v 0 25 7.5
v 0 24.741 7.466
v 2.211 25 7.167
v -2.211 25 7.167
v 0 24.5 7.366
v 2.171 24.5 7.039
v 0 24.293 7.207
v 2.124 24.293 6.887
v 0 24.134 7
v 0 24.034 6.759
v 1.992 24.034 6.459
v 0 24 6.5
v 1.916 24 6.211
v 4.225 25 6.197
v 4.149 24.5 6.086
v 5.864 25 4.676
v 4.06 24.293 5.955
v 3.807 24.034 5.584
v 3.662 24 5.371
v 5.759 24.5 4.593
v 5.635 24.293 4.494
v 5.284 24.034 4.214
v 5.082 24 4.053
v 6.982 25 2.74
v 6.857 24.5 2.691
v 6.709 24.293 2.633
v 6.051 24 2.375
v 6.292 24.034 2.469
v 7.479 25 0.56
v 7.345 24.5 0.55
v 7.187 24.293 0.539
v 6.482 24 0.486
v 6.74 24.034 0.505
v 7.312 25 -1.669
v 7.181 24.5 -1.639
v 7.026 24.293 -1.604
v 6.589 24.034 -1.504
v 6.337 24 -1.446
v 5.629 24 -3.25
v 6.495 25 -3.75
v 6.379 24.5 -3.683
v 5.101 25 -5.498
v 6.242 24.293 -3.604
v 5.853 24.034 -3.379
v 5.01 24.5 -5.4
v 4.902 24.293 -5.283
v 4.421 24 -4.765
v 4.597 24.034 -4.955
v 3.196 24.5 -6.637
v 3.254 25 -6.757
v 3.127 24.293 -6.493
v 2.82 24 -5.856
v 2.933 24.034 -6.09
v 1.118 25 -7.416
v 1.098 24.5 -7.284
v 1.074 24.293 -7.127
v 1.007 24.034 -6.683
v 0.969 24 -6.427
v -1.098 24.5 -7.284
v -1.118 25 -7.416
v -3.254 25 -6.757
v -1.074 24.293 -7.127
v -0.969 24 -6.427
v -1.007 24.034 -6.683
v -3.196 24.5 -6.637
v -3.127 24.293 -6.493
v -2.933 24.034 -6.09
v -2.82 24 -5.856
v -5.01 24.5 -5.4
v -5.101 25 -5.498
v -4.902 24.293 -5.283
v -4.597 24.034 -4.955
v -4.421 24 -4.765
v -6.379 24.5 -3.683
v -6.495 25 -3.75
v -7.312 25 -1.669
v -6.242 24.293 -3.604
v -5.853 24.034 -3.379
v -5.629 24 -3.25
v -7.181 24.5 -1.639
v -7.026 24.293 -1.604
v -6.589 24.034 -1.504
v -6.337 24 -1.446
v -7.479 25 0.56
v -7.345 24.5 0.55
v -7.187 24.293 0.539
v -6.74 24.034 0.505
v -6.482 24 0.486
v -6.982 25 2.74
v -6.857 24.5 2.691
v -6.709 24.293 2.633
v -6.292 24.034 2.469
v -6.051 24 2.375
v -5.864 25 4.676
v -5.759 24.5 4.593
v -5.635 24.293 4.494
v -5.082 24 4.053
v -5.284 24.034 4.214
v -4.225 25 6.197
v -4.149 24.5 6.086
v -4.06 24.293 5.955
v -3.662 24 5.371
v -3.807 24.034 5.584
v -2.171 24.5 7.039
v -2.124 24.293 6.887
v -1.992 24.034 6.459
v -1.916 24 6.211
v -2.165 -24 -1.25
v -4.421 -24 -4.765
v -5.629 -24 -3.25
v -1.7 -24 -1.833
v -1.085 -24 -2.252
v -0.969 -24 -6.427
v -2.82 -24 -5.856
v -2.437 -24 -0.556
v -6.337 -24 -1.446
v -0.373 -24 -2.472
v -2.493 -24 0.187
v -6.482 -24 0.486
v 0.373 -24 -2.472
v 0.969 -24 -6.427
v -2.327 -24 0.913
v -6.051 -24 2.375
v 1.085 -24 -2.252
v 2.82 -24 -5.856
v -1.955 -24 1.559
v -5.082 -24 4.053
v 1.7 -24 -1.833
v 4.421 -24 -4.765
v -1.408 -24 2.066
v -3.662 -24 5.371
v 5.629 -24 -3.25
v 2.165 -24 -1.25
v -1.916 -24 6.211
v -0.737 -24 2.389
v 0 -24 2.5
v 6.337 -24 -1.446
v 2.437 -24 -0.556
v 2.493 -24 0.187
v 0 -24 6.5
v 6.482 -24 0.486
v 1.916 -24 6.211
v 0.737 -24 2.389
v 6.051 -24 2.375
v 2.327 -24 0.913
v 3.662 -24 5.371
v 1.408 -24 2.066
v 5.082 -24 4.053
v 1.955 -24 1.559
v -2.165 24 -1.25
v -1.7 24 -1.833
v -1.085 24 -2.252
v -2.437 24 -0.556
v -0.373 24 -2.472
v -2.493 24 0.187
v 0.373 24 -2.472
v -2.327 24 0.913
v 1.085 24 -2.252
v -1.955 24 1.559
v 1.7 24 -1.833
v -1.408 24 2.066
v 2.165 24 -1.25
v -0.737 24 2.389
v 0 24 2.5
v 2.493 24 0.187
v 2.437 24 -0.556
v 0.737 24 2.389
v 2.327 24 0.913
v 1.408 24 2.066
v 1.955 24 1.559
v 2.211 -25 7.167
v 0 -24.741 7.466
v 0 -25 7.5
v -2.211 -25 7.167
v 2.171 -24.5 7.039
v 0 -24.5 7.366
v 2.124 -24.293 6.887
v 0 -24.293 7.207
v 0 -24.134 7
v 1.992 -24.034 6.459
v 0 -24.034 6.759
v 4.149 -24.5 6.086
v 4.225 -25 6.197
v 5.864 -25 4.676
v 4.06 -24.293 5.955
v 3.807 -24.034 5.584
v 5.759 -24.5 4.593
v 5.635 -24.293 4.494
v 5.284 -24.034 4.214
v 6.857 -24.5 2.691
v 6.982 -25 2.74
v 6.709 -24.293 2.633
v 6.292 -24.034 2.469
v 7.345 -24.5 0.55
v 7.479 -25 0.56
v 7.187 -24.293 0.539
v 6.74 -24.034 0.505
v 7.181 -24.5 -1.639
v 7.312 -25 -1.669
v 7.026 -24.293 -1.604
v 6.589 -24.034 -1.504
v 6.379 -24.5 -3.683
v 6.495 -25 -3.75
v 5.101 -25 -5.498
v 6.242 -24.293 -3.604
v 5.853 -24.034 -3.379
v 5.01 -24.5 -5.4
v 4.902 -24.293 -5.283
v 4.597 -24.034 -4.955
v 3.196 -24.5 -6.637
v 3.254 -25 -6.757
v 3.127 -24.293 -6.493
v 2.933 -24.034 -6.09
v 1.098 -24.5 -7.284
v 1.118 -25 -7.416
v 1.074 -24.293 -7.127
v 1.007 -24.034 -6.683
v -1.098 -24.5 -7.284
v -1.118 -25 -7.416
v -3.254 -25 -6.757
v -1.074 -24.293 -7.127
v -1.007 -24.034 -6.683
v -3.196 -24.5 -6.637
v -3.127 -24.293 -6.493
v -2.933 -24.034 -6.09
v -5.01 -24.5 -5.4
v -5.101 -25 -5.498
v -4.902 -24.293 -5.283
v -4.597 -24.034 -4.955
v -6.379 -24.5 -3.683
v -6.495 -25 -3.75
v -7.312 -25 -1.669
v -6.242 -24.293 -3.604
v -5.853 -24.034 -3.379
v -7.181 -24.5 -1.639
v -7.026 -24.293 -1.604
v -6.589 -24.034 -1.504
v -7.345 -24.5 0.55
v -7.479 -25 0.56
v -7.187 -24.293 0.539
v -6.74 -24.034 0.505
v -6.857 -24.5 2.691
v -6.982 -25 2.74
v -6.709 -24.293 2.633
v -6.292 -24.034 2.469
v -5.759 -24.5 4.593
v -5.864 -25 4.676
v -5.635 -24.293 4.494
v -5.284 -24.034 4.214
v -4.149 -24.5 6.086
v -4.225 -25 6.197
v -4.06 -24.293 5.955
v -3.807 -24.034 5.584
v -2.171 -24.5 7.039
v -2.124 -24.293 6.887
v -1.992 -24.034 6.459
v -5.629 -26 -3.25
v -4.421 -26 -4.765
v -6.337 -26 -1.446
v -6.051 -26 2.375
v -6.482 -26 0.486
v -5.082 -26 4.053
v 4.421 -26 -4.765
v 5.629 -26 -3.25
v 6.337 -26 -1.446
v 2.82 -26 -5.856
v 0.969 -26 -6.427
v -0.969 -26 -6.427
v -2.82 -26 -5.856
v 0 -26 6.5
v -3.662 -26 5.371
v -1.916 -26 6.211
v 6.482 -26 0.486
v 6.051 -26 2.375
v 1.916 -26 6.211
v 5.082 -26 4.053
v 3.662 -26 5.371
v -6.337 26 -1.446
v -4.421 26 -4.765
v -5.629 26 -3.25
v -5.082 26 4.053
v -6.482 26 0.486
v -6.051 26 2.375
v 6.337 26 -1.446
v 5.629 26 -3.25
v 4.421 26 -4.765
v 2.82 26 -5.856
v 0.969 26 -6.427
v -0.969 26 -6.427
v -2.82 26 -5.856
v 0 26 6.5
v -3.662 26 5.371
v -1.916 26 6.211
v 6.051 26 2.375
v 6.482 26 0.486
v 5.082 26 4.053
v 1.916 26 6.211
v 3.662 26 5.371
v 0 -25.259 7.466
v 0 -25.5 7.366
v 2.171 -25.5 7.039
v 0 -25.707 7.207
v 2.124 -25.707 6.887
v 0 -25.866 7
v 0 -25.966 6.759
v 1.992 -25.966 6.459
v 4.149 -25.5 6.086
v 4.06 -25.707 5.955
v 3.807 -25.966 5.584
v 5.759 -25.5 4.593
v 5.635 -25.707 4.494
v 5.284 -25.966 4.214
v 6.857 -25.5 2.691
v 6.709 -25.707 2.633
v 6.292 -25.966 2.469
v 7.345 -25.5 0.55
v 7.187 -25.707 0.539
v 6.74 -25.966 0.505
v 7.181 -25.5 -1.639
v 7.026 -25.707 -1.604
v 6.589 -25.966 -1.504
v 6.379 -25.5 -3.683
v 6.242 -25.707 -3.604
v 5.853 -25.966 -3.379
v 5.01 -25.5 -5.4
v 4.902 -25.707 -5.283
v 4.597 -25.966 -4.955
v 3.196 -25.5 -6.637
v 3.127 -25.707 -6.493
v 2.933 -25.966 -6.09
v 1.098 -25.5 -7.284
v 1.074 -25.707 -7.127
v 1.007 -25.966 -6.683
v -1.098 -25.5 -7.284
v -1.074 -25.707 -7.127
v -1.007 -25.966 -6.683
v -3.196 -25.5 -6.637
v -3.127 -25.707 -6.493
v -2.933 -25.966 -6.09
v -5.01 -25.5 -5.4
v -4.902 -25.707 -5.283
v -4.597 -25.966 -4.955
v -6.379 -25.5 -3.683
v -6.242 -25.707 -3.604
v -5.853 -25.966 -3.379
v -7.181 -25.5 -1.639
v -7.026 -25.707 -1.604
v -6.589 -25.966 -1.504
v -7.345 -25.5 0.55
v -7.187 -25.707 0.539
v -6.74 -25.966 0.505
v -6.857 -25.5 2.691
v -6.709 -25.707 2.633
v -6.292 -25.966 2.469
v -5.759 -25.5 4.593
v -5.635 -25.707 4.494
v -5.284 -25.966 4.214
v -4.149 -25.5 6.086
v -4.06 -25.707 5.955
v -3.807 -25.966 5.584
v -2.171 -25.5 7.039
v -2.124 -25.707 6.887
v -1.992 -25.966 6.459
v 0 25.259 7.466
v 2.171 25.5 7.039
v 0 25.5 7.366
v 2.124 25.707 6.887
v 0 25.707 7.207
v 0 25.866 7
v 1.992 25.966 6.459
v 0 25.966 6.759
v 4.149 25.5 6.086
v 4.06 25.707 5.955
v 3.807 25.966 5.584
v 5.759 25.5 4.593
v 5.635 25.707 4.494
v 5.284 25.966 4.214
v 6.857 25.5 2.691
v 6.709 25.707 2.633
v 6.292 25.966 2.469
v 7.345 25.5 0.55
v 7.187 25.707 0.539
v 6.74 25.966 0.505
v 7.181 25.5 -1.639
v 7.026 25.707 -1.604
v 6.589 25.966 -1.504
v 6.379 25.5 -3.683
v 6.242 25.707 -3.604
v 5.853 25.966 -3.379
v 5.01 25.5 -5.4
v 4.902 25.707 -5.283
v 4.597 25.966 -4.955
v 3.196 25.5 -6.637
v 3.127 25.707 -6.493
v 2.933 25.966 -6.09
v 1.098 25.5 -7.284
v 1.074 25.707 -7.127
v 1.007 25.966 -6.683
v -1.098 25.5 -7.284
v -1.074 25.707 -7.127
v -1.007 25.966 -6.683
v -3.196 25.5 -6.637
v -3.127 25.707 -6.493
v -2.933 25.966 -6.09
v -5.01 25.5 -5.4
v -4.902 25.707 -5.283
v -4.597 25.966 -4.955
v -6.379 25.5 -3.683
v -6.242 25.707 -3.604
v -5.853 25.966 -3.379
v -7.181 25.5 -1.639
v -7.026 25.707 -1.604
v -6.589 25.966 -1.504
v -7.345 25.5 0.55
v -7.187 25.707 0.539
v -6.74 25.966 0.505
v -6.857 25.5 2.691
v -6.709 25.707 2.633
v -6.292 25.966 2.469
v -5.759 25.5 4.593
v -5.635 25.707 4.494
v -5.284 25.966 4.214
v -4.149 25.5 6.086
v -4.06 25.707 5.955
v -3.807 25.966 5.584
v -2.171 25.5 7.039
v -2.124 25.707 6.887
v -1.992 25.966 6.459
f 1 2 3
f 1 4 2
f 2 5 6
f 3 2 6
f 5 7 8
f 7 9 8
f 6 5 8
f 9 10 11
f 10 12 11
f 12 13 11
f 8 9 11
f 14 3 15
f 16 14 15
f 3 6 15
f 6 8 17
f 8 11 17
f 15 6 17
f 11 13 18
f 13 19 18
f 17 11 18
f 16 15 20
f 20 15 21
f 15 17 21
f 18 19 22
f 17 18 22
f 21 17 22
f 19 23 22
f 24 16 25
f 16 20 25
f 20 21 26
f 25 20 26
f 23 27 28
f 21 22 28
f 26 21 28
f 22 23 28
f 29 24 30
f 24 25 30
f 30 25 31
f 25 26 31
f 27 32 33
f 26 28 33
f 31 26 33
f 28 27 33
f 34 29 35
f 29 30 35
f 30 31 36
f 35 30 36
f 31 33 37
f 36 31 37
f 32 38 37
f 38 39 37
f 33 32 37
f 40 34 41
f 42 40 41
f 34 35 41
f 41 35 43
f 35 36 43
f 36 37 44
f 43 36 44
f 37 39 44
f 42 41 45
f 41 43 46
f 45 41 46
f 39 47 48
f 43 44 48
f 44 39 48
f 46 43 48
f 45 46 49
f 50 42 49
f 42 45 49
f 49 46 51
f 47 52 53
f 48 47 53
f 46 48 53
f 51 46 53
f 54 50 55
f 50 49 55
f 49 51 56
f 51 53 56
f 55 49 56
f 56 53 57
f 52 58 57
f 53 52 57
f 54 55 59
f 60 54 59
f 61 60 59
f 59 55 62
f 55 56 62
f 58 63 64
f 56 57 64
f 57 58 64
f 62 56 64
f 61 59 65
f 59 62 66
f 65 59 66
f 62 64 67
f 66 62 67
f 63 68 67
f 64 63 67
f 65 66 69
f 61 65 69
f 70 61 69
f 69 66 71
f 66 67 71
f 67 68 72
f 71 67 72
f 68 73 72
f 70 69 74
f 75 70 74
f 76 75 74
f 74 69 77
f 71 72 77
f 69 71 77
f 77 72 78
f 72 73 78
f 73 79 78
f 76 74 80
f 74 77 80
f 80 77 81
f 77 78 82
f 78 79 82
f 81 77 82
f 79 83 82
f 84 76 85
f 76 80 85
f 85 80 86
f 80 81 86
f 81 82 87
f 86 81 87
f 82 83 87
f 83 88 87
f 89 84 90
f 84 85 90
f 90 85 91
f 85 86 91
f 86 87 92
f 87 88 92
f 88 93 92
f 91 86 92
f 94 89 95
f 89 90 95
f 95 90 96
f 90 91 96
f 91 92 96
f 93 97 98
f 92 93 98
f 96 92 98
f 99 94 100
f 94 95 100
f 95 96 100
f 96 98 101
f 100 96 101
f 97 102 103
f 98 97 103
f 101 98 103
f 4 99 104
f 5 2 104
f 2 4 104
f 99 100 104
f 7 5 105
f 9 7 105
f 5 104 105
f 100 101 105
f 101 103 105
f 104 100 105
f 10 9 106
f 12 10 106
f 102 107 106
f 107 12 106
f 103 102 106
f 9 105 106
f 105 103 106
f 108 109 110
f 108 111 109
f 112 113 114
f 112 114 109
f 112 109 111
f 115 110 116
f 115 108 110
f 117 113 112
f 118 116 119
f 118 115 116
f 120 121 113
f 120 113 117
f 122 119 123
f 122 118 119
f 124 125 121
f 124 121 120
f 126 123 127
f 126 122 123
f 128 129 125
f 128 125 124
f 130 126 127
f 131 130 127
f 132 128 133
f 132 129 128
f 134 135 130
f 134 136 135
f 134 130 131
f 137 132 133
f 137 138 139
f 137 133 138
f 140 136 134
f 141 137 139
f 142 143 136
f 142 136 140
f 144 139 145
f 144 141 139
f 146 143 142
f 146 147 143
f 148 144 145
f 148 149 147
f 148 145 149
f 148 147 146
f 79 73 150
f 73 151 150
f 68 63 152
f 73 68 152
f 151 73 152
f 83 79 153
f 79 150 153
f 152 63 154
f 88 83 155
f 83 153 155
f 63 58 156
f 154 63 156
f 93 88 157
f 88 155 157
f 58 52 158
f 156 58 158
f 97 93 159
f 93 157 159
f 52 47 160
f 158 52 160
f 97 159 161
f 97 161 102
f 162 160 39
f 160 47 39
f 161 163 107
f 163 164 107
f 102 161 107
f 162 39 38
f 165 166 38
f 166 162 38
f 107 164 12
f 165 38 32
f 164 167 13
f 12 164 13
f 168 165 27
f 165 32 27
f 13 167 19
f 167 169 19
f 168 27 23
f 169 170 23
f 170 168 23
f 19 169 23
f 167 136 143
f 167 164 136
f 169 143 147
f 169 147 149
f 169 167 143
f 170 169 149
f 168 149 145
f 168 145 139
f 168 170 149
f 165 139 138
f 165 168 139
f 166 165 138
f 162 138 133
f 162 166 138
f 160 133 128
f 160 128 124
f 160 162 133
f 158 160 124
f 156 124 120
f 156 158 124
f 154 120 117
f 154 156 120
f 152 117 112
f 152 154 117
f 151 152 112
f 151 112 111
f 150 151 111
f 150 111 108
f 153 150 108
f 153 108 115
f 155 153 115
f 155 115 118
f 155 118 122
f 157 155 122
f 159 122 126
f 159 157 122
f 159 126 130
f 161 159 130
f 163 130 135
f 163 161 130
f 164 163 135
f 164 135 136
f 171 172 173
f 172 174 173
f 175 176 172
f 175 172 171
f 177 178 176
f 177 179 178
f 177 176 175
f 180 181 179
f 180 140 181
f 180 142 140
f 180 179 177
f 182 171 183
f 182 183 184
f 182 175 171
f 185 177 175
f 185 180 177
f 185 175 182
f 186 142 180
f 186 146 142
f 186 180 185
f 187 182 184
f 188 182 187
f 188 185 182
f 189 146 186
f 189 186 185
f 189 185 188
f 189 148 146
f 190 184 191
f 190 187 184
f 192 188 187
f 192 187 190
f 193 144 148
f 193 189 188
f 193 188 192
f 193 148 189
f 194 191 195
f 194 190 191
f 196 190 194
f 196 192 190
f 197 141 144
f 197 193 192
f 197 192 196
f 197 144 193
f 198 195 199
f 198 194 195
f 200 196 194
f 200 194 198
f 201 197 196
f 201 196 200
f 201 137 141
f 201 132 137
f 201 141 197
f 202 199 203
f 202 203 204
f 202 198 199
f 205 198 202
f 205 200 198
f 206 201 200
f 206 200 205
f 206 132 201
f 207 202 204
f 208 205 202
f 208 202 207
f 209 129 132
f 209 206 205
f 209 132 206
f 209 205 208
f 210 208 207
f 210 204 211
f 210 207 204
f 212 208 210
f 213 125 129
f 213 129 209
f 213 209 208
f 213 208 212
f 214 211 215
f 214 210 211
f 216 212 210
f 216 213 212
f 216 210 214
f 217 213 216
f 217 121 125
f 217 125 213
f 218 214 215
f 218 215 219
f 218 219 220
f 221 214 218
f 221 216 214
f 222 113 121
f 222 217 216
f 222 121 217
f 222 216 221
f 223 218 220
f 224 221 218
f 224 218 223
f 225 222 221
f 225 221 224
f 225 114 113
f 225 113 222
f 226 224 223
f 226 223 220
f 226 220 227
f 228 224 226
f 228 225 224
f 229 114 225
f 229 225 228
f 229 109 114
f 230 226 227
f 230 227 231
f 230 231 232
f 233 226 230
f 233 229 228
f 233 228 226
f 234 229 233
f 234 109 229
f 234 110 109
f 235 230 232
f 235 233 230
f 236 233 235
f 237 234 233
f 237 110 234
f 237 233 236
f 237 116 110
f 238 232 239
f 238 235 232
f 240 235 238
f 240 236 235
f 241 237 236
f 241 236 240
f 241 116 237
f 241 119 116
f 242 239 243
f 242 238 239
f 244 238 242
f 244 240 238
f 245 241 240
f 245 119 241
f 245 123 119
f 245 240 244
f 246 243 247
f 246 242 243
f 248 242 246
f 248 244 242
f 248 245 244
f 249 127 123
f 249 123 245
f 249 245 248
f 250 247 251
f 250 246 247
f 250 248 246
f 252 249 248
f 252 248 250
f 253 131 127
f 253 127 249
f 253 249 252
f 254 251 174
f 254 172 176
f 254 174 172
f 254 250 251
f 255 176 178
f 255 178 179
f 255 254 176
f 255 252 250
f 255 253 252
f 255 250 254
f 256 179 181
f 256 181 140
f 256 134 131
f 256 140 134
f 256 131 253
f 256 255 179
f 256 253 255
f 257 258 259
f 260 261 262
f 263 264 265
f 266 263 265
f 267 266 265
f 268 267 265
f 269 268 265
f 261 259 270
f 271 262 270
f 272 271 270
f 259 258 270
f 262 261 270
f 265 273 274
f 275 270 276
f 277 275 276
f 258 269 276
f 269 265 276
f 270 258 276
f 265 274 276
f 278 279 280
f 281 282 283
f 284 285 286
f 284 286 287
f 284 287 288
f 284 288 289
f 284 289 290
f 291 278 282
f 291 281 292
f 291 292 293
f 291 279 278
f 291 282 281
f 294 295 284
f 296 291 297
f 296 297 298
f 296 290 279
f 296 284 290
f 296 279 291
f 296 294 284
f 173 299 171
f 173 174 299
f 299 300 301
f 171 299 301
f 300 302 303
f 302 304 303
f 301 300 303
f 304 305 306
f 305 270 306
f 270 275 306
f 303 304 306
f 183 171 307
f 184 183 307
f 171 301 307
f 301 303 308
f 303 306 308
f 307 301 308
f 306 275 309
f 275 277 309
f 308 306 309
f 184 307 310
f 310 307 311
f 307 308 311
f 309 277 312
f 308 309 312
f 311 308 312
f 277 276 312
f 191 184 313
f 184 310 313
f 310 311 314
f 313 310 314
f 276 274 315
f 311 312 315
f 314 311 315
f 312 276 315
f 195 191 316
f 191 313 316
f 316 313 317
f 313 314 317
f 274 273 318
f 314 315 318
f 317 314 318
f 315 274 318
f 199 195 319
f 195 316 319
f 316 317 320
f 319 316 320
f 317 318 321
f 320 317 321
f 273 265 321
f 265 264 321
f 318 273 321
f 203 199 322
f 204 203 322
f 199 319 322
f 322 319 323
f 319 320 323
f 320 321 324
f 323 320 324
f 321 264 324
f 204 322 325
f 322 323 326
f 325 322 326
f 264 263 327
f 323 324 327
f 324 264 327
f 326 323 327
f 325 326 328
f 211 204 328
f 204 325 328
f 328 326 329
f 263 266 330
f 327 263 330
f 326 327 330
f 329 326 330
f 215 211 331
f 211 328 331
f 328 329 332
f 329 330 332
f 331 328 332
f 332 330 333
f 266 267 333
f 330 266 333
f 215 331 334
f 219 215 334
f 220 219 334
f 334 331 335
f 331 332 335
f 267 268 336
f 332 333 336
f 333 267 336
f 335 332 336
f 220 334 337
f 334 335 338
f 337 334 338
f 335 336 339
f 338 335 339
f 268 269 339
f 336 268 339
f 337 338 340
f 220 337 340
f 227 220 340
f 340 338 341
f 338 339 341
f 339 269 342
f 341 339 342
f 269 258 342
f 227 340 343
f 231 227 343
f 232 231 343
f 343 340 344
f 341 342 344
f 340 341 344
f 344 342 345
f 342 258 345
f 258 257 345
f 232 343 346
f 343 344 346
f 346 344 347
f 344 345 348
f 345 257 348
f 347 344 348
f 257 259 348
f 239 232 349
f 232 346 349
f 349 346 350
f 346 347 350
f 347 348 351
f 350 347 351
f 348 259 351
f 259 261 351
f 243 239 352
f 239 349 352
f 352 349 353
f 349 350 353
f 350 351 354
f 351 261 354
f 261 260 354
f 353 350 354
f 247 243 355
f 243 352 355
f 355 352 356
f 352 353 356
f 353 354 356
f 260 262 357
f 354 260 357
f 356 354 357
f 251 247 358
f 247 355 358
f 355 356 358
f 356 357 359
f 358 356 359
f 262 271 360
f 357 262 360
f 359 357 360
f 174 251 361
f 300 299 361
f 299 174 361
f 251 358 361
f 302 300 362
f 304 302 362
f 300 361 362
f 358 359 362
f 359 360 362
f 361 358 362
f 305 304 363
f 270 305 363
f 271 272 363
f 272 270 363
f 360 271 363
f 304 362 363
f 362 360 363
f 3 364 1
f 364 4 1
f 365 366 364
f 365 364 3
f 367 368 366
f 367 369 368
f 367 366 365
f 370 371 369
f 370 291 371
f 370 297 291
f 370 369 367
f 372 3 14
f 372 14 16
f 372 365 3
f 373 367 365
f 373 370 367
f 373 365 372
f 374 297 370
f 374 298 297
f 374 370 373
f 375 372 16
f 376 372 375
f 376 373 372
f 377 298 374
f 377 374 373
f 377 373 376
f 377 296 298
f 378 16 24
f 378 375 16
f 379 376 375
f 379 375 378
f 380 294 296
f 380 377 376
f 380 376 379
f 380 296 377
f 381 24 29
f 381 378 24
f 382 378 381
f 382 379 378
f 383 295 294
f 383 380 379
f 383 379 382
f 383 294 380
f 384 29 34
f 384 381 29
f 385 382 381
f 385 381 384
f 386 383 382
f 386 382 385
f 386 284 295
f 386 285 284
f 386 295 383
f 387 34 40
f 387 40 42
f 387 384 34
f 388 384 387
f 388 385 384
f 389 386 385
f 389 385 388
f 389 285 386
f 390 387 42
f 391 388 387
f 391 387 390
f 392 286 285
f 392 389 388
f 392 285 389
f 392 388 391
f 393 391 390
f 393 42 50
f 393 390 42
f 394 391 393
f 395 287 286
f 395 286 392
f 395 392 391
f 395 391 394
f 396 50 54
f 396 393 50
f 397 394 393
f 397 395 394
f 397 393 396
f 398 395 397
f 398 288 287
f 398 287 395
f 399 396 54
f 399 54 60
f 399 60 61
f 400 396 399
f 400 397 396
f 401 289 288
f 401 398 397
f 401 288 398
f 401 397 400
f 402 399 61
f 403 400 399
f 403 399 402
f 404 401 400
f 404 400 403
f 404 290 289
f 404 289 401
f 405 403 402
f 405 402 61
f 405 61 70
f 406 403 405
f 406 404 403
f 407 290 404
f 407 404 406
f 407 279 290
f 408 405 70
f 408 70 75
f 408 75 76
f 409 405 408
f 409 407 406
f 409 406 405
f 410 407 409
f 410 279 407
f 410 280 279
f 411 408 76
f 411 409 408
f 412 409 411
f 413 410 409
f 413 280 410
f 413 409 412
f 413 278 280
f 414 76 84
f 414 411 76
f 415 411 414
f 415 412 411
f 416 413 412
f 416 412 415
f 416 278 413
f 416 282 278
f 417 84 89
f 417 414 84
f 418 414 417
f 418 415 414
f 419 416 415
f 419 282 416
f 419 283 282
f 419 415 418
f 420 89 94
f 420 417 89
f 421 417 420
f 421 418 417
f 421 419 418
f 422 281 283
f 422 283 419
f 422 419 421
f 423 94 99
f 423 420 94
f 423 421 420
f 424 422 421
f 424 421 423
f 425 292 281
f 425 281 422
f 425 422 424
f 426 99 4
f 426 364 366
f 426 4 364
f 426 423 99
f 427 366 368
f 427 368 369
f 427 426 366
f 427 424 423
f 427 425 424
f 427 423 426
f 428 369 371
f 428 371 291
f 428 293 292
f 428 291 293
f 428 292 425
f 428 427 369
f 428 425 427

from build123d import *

# Parameters (mm, degrees)
SKETCH1_R           = 2.5
BOSS_EXTRUDE1_DEPTH = 24
SKETCH2_R           = 7.5
BOSS_EXTRUDE2_DEPTH = 2
FILLET1_R           = 1


with BuildPart() as part:
    # Sketch1 → Boss-Extrude1 (new body)
    with BuildSketch(Plane(origin=(0, 0, 0), x_dir=(1, 0, 0), z_dir=(0, 1, 0))):
        with Locations(Location((0, 0, 0), (0, 0, 270))):
            Circle(SKETCH1_R)
    extrude(amount=BOSS_EXTRUDE1_DEPTH)

    # Sketch2 → Boss-Extrude2 (add)
    with BuildSketch(Plane(origin=(0, 24, 0), x_dir=(1, 0, 0), z_dir=(0, 1, 0))):
        with Locations(Location((0, 0, 0), (0, 0, 270))):
            Circle(SKETCH2_R)
    extrude(amount=BOSS_EXTRUDE2_DEPTH)

    # Fillet1
    fillet1_edges = [part.edges().sort_by_distance(p)[0] for p in [
        (0, 24, -7.5),
        (0, 26, -7.5),
    ]]
    fillet(fillet1_edges, radius=FILLET1_R - 0.0001)  # a hair under: the kernel refuses the full size

    # Mirror1: part across plane


with BuildPart() as part_1:
    add(part.part)
    add(part.part.mirror(Plane.ZX))


solid = part_1.part
